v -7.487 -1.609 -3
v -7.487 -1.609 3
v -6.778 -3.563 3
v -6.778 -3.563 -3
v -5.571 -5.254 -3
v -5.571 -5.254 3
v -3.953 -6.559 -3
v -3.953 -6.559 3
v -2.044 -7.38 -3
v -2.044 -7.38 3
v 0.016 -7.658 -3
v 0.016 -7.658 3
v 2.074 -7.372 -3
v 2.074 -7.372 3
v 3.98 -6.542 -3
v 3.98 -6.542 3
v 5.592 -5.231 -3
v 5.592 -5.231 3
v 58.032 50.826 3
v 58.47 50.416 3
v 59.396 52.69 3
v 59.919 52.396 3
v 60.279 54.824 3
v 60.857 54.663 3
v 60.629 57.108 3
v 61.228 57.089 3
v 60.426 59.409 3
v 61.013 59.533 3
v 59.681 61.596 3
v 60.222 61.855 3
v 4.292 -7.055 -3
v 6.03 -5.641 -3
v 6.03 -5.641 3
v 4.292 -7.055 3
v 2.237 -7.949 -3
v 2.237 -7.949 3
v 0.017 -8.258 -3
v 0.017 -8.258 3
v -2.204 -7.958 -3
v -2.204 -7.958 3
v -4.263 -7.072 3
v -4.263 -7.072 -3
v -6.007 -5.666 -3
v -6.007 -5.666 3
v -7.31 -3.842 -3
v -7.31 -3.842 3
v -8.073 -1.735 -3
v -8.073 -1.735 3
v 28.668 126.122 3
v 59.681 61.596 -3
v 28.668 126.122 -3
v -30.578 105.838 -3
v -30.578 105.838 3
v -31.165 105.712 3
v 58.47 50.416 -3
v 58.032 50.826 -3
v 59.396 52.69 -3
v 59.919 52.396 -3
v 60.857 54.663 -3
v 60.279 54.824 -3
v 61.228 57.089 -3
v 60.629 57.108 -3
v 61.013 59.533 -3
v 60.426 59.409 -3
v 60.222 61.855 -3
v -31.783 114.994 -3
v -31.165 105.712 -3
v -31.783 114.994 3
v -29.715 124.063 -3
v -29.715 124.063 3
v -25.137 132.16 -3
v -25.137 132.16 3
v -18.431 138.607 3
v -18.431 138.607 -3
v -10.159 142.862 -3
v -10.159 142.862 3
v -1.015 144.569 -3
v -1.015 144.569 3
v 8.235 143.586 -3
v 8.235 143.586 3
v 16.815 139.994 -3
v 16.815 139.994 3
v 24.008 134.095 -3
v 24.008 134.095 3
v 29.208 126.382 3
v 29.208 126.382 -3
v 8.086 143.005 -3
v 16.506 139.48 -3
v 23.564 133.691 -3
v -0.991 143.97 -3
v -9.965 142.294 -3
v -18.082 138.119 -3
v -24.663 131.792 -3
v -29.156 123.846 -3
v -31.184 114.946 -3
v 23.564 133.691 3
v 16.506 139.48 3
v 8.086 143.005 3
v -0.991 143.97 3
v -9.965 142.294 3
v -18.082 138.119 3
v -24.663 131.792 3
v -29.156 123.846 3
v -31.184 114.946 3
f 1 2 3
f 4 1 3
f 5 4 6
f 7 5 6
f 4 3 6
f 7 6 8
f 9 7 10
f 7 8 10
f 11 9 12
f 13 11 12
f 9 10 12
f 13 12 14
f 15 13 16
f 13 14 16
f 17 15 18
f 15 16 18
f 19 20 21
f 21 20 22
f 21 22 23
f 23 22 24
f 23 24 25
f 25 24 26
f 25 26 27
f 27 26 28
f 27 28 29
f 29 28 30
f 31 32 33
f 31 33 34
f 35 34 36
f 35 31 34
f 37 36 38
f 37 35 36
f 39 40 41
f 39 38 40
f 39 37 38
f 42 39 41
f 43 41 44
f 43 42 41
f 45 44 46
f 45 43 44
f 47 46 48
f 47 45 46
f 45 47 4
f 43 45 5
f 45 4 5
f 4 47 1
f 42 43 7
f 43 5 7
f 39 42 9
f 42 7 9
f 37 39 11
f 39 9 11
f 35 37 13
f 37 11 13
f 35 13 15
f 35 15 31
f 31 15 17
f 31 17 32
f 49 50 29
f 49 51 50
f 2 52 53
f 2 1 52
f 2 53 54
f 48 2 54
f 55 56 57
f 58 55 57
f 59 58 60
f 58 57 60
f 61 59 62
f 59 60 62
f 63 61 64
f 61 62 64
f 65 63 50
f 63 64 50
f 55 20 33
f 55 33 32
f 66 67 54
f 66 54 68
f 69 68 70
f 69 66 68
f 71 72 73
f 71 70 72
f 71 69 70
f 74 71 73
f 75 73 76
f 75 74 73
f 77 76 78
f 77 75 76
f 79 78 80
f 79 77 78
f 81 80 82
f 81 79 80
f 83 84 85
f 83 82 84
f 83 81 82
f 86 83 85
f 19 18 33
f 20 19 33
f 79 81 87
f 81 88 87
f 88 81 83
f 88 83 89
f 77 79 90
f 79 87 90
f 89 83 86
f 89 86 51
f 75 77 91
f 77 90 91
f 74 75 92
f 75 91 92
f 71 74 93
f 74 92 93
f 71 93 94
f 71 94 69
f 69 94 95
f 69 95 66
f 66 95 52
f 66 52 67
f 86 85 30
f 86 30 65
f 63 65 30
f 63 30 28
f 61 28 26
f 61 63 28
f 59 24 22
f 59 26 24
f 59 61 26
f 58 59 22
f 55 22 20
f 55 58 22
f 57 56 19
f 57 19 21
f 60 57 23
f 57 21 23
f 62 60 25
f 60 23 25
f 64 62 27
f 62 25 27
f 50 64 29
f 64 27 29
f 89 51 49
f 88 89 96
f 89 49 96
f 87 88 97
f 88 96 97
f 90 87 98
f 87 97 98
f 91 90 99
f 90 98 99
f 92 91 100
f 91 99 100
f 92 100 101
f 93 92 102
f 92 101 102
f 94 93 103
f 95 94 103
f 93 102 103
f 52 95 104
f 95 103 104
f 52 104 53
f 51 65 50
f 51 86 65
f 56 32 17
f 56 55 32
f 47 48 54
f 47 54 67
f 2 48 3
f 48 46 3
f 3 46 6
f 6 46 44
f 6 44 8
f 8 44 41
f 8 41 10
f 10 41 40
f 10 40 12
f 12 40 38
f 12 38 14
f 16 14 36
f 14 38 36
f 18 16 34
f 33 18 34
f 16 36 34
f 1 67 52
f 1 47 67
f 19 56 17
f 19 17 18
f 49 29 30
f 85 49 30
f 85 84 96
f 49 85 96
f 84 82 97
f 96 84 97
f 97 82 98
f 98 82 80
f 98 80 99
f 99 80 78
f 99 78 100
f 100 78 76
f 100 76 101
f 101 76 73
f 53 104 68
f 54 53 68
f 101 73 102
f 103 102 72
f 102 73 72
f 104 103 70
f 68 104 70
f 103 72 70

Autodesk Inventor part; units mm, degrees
sketch "Sketch Path" plane through (0, 0, 0) normal (0, 0, 1) x (1, 0, 0)
  arc A0 (-7.7801, -1.672) -> (5.8114, -5.4363) centre (0, 0) ccw
  arc A1 (28.9379, 126.2523) -> (-30.8718, 105.775) centre (0.2486, 112.4632) ccw
  arc A2 (58.2507, 50.621) -> (59.9518, 61.7255) centre (50.9864, 57.4164) ccw
  line L0 (58.2507, 50.621) -> (5.8114, -5.4363)
  line L1 (-7.7801, -1.672) -> (-30.8718, 105.775)
  line L2 (28.9379, 126.2523) -> (59.9518, 61.7255)
ref_plane "Cross Section Plane" through (5.8114, -5.4363, 0) normal (0.6831, 0.7303, 0) x (0, 0, 1)
ref_plane "Work Plane2" through (0, 0, 0) normal (-1, 0, 0) x (0, 0, 1)
ref_plane "Work Plane3" through (0.2486, 112.4632, 0) normal (0.155, -0.9879, 0) x (0, 0, 1)
ref_plane "Work Plane4" through (50.9864, 57.4164, 0) normal (-0.4137, 0.9104, 0) x (0, 0, 1)
sketch "Cross Section" plane through (5.8114, -5.4363, 0) normal (0.6831, 0.7303, 0) x (0, 0, 1)
  line L0 (-3, 0.3) -> (3, 0.3)
  line L1 (3, 0.3) -> (3, -0.3)
  line L2 (3, -0.3) -> (-3, -0.3)
  line L3 (-3, -0.3) -> (-3, 0.3)
  line L4 (-3, 0) -> (3, 0) construction
  point P0 (0, 0)
  point P1 (0, 0)
  dimension "d0" = 6
  dimension "d4" = 0.3
  dimension "d5" = 0.3
sweep "Belt" add profiles "Cross Section" path "Sketch Path"
equation "\"d0\" = da_B"
equation "\"d4\" = da_a"
equation "\"d5\" = da_a2"
equation "\"da_B\" = 6"
equation "\"da_pb\" = 2.5"
equation "\"da_a\" = 0.3"
equation "\"da_S\" = 1.5"
equation "\"da_Beta\" = 20deg"
equation "\"da_Ht\" = 0.7"
equation "\"da_H\" = 1.3"
equation "\"da_a2\" = 0.3"
properties part number "Synchronous Belt" material "Rubber"
